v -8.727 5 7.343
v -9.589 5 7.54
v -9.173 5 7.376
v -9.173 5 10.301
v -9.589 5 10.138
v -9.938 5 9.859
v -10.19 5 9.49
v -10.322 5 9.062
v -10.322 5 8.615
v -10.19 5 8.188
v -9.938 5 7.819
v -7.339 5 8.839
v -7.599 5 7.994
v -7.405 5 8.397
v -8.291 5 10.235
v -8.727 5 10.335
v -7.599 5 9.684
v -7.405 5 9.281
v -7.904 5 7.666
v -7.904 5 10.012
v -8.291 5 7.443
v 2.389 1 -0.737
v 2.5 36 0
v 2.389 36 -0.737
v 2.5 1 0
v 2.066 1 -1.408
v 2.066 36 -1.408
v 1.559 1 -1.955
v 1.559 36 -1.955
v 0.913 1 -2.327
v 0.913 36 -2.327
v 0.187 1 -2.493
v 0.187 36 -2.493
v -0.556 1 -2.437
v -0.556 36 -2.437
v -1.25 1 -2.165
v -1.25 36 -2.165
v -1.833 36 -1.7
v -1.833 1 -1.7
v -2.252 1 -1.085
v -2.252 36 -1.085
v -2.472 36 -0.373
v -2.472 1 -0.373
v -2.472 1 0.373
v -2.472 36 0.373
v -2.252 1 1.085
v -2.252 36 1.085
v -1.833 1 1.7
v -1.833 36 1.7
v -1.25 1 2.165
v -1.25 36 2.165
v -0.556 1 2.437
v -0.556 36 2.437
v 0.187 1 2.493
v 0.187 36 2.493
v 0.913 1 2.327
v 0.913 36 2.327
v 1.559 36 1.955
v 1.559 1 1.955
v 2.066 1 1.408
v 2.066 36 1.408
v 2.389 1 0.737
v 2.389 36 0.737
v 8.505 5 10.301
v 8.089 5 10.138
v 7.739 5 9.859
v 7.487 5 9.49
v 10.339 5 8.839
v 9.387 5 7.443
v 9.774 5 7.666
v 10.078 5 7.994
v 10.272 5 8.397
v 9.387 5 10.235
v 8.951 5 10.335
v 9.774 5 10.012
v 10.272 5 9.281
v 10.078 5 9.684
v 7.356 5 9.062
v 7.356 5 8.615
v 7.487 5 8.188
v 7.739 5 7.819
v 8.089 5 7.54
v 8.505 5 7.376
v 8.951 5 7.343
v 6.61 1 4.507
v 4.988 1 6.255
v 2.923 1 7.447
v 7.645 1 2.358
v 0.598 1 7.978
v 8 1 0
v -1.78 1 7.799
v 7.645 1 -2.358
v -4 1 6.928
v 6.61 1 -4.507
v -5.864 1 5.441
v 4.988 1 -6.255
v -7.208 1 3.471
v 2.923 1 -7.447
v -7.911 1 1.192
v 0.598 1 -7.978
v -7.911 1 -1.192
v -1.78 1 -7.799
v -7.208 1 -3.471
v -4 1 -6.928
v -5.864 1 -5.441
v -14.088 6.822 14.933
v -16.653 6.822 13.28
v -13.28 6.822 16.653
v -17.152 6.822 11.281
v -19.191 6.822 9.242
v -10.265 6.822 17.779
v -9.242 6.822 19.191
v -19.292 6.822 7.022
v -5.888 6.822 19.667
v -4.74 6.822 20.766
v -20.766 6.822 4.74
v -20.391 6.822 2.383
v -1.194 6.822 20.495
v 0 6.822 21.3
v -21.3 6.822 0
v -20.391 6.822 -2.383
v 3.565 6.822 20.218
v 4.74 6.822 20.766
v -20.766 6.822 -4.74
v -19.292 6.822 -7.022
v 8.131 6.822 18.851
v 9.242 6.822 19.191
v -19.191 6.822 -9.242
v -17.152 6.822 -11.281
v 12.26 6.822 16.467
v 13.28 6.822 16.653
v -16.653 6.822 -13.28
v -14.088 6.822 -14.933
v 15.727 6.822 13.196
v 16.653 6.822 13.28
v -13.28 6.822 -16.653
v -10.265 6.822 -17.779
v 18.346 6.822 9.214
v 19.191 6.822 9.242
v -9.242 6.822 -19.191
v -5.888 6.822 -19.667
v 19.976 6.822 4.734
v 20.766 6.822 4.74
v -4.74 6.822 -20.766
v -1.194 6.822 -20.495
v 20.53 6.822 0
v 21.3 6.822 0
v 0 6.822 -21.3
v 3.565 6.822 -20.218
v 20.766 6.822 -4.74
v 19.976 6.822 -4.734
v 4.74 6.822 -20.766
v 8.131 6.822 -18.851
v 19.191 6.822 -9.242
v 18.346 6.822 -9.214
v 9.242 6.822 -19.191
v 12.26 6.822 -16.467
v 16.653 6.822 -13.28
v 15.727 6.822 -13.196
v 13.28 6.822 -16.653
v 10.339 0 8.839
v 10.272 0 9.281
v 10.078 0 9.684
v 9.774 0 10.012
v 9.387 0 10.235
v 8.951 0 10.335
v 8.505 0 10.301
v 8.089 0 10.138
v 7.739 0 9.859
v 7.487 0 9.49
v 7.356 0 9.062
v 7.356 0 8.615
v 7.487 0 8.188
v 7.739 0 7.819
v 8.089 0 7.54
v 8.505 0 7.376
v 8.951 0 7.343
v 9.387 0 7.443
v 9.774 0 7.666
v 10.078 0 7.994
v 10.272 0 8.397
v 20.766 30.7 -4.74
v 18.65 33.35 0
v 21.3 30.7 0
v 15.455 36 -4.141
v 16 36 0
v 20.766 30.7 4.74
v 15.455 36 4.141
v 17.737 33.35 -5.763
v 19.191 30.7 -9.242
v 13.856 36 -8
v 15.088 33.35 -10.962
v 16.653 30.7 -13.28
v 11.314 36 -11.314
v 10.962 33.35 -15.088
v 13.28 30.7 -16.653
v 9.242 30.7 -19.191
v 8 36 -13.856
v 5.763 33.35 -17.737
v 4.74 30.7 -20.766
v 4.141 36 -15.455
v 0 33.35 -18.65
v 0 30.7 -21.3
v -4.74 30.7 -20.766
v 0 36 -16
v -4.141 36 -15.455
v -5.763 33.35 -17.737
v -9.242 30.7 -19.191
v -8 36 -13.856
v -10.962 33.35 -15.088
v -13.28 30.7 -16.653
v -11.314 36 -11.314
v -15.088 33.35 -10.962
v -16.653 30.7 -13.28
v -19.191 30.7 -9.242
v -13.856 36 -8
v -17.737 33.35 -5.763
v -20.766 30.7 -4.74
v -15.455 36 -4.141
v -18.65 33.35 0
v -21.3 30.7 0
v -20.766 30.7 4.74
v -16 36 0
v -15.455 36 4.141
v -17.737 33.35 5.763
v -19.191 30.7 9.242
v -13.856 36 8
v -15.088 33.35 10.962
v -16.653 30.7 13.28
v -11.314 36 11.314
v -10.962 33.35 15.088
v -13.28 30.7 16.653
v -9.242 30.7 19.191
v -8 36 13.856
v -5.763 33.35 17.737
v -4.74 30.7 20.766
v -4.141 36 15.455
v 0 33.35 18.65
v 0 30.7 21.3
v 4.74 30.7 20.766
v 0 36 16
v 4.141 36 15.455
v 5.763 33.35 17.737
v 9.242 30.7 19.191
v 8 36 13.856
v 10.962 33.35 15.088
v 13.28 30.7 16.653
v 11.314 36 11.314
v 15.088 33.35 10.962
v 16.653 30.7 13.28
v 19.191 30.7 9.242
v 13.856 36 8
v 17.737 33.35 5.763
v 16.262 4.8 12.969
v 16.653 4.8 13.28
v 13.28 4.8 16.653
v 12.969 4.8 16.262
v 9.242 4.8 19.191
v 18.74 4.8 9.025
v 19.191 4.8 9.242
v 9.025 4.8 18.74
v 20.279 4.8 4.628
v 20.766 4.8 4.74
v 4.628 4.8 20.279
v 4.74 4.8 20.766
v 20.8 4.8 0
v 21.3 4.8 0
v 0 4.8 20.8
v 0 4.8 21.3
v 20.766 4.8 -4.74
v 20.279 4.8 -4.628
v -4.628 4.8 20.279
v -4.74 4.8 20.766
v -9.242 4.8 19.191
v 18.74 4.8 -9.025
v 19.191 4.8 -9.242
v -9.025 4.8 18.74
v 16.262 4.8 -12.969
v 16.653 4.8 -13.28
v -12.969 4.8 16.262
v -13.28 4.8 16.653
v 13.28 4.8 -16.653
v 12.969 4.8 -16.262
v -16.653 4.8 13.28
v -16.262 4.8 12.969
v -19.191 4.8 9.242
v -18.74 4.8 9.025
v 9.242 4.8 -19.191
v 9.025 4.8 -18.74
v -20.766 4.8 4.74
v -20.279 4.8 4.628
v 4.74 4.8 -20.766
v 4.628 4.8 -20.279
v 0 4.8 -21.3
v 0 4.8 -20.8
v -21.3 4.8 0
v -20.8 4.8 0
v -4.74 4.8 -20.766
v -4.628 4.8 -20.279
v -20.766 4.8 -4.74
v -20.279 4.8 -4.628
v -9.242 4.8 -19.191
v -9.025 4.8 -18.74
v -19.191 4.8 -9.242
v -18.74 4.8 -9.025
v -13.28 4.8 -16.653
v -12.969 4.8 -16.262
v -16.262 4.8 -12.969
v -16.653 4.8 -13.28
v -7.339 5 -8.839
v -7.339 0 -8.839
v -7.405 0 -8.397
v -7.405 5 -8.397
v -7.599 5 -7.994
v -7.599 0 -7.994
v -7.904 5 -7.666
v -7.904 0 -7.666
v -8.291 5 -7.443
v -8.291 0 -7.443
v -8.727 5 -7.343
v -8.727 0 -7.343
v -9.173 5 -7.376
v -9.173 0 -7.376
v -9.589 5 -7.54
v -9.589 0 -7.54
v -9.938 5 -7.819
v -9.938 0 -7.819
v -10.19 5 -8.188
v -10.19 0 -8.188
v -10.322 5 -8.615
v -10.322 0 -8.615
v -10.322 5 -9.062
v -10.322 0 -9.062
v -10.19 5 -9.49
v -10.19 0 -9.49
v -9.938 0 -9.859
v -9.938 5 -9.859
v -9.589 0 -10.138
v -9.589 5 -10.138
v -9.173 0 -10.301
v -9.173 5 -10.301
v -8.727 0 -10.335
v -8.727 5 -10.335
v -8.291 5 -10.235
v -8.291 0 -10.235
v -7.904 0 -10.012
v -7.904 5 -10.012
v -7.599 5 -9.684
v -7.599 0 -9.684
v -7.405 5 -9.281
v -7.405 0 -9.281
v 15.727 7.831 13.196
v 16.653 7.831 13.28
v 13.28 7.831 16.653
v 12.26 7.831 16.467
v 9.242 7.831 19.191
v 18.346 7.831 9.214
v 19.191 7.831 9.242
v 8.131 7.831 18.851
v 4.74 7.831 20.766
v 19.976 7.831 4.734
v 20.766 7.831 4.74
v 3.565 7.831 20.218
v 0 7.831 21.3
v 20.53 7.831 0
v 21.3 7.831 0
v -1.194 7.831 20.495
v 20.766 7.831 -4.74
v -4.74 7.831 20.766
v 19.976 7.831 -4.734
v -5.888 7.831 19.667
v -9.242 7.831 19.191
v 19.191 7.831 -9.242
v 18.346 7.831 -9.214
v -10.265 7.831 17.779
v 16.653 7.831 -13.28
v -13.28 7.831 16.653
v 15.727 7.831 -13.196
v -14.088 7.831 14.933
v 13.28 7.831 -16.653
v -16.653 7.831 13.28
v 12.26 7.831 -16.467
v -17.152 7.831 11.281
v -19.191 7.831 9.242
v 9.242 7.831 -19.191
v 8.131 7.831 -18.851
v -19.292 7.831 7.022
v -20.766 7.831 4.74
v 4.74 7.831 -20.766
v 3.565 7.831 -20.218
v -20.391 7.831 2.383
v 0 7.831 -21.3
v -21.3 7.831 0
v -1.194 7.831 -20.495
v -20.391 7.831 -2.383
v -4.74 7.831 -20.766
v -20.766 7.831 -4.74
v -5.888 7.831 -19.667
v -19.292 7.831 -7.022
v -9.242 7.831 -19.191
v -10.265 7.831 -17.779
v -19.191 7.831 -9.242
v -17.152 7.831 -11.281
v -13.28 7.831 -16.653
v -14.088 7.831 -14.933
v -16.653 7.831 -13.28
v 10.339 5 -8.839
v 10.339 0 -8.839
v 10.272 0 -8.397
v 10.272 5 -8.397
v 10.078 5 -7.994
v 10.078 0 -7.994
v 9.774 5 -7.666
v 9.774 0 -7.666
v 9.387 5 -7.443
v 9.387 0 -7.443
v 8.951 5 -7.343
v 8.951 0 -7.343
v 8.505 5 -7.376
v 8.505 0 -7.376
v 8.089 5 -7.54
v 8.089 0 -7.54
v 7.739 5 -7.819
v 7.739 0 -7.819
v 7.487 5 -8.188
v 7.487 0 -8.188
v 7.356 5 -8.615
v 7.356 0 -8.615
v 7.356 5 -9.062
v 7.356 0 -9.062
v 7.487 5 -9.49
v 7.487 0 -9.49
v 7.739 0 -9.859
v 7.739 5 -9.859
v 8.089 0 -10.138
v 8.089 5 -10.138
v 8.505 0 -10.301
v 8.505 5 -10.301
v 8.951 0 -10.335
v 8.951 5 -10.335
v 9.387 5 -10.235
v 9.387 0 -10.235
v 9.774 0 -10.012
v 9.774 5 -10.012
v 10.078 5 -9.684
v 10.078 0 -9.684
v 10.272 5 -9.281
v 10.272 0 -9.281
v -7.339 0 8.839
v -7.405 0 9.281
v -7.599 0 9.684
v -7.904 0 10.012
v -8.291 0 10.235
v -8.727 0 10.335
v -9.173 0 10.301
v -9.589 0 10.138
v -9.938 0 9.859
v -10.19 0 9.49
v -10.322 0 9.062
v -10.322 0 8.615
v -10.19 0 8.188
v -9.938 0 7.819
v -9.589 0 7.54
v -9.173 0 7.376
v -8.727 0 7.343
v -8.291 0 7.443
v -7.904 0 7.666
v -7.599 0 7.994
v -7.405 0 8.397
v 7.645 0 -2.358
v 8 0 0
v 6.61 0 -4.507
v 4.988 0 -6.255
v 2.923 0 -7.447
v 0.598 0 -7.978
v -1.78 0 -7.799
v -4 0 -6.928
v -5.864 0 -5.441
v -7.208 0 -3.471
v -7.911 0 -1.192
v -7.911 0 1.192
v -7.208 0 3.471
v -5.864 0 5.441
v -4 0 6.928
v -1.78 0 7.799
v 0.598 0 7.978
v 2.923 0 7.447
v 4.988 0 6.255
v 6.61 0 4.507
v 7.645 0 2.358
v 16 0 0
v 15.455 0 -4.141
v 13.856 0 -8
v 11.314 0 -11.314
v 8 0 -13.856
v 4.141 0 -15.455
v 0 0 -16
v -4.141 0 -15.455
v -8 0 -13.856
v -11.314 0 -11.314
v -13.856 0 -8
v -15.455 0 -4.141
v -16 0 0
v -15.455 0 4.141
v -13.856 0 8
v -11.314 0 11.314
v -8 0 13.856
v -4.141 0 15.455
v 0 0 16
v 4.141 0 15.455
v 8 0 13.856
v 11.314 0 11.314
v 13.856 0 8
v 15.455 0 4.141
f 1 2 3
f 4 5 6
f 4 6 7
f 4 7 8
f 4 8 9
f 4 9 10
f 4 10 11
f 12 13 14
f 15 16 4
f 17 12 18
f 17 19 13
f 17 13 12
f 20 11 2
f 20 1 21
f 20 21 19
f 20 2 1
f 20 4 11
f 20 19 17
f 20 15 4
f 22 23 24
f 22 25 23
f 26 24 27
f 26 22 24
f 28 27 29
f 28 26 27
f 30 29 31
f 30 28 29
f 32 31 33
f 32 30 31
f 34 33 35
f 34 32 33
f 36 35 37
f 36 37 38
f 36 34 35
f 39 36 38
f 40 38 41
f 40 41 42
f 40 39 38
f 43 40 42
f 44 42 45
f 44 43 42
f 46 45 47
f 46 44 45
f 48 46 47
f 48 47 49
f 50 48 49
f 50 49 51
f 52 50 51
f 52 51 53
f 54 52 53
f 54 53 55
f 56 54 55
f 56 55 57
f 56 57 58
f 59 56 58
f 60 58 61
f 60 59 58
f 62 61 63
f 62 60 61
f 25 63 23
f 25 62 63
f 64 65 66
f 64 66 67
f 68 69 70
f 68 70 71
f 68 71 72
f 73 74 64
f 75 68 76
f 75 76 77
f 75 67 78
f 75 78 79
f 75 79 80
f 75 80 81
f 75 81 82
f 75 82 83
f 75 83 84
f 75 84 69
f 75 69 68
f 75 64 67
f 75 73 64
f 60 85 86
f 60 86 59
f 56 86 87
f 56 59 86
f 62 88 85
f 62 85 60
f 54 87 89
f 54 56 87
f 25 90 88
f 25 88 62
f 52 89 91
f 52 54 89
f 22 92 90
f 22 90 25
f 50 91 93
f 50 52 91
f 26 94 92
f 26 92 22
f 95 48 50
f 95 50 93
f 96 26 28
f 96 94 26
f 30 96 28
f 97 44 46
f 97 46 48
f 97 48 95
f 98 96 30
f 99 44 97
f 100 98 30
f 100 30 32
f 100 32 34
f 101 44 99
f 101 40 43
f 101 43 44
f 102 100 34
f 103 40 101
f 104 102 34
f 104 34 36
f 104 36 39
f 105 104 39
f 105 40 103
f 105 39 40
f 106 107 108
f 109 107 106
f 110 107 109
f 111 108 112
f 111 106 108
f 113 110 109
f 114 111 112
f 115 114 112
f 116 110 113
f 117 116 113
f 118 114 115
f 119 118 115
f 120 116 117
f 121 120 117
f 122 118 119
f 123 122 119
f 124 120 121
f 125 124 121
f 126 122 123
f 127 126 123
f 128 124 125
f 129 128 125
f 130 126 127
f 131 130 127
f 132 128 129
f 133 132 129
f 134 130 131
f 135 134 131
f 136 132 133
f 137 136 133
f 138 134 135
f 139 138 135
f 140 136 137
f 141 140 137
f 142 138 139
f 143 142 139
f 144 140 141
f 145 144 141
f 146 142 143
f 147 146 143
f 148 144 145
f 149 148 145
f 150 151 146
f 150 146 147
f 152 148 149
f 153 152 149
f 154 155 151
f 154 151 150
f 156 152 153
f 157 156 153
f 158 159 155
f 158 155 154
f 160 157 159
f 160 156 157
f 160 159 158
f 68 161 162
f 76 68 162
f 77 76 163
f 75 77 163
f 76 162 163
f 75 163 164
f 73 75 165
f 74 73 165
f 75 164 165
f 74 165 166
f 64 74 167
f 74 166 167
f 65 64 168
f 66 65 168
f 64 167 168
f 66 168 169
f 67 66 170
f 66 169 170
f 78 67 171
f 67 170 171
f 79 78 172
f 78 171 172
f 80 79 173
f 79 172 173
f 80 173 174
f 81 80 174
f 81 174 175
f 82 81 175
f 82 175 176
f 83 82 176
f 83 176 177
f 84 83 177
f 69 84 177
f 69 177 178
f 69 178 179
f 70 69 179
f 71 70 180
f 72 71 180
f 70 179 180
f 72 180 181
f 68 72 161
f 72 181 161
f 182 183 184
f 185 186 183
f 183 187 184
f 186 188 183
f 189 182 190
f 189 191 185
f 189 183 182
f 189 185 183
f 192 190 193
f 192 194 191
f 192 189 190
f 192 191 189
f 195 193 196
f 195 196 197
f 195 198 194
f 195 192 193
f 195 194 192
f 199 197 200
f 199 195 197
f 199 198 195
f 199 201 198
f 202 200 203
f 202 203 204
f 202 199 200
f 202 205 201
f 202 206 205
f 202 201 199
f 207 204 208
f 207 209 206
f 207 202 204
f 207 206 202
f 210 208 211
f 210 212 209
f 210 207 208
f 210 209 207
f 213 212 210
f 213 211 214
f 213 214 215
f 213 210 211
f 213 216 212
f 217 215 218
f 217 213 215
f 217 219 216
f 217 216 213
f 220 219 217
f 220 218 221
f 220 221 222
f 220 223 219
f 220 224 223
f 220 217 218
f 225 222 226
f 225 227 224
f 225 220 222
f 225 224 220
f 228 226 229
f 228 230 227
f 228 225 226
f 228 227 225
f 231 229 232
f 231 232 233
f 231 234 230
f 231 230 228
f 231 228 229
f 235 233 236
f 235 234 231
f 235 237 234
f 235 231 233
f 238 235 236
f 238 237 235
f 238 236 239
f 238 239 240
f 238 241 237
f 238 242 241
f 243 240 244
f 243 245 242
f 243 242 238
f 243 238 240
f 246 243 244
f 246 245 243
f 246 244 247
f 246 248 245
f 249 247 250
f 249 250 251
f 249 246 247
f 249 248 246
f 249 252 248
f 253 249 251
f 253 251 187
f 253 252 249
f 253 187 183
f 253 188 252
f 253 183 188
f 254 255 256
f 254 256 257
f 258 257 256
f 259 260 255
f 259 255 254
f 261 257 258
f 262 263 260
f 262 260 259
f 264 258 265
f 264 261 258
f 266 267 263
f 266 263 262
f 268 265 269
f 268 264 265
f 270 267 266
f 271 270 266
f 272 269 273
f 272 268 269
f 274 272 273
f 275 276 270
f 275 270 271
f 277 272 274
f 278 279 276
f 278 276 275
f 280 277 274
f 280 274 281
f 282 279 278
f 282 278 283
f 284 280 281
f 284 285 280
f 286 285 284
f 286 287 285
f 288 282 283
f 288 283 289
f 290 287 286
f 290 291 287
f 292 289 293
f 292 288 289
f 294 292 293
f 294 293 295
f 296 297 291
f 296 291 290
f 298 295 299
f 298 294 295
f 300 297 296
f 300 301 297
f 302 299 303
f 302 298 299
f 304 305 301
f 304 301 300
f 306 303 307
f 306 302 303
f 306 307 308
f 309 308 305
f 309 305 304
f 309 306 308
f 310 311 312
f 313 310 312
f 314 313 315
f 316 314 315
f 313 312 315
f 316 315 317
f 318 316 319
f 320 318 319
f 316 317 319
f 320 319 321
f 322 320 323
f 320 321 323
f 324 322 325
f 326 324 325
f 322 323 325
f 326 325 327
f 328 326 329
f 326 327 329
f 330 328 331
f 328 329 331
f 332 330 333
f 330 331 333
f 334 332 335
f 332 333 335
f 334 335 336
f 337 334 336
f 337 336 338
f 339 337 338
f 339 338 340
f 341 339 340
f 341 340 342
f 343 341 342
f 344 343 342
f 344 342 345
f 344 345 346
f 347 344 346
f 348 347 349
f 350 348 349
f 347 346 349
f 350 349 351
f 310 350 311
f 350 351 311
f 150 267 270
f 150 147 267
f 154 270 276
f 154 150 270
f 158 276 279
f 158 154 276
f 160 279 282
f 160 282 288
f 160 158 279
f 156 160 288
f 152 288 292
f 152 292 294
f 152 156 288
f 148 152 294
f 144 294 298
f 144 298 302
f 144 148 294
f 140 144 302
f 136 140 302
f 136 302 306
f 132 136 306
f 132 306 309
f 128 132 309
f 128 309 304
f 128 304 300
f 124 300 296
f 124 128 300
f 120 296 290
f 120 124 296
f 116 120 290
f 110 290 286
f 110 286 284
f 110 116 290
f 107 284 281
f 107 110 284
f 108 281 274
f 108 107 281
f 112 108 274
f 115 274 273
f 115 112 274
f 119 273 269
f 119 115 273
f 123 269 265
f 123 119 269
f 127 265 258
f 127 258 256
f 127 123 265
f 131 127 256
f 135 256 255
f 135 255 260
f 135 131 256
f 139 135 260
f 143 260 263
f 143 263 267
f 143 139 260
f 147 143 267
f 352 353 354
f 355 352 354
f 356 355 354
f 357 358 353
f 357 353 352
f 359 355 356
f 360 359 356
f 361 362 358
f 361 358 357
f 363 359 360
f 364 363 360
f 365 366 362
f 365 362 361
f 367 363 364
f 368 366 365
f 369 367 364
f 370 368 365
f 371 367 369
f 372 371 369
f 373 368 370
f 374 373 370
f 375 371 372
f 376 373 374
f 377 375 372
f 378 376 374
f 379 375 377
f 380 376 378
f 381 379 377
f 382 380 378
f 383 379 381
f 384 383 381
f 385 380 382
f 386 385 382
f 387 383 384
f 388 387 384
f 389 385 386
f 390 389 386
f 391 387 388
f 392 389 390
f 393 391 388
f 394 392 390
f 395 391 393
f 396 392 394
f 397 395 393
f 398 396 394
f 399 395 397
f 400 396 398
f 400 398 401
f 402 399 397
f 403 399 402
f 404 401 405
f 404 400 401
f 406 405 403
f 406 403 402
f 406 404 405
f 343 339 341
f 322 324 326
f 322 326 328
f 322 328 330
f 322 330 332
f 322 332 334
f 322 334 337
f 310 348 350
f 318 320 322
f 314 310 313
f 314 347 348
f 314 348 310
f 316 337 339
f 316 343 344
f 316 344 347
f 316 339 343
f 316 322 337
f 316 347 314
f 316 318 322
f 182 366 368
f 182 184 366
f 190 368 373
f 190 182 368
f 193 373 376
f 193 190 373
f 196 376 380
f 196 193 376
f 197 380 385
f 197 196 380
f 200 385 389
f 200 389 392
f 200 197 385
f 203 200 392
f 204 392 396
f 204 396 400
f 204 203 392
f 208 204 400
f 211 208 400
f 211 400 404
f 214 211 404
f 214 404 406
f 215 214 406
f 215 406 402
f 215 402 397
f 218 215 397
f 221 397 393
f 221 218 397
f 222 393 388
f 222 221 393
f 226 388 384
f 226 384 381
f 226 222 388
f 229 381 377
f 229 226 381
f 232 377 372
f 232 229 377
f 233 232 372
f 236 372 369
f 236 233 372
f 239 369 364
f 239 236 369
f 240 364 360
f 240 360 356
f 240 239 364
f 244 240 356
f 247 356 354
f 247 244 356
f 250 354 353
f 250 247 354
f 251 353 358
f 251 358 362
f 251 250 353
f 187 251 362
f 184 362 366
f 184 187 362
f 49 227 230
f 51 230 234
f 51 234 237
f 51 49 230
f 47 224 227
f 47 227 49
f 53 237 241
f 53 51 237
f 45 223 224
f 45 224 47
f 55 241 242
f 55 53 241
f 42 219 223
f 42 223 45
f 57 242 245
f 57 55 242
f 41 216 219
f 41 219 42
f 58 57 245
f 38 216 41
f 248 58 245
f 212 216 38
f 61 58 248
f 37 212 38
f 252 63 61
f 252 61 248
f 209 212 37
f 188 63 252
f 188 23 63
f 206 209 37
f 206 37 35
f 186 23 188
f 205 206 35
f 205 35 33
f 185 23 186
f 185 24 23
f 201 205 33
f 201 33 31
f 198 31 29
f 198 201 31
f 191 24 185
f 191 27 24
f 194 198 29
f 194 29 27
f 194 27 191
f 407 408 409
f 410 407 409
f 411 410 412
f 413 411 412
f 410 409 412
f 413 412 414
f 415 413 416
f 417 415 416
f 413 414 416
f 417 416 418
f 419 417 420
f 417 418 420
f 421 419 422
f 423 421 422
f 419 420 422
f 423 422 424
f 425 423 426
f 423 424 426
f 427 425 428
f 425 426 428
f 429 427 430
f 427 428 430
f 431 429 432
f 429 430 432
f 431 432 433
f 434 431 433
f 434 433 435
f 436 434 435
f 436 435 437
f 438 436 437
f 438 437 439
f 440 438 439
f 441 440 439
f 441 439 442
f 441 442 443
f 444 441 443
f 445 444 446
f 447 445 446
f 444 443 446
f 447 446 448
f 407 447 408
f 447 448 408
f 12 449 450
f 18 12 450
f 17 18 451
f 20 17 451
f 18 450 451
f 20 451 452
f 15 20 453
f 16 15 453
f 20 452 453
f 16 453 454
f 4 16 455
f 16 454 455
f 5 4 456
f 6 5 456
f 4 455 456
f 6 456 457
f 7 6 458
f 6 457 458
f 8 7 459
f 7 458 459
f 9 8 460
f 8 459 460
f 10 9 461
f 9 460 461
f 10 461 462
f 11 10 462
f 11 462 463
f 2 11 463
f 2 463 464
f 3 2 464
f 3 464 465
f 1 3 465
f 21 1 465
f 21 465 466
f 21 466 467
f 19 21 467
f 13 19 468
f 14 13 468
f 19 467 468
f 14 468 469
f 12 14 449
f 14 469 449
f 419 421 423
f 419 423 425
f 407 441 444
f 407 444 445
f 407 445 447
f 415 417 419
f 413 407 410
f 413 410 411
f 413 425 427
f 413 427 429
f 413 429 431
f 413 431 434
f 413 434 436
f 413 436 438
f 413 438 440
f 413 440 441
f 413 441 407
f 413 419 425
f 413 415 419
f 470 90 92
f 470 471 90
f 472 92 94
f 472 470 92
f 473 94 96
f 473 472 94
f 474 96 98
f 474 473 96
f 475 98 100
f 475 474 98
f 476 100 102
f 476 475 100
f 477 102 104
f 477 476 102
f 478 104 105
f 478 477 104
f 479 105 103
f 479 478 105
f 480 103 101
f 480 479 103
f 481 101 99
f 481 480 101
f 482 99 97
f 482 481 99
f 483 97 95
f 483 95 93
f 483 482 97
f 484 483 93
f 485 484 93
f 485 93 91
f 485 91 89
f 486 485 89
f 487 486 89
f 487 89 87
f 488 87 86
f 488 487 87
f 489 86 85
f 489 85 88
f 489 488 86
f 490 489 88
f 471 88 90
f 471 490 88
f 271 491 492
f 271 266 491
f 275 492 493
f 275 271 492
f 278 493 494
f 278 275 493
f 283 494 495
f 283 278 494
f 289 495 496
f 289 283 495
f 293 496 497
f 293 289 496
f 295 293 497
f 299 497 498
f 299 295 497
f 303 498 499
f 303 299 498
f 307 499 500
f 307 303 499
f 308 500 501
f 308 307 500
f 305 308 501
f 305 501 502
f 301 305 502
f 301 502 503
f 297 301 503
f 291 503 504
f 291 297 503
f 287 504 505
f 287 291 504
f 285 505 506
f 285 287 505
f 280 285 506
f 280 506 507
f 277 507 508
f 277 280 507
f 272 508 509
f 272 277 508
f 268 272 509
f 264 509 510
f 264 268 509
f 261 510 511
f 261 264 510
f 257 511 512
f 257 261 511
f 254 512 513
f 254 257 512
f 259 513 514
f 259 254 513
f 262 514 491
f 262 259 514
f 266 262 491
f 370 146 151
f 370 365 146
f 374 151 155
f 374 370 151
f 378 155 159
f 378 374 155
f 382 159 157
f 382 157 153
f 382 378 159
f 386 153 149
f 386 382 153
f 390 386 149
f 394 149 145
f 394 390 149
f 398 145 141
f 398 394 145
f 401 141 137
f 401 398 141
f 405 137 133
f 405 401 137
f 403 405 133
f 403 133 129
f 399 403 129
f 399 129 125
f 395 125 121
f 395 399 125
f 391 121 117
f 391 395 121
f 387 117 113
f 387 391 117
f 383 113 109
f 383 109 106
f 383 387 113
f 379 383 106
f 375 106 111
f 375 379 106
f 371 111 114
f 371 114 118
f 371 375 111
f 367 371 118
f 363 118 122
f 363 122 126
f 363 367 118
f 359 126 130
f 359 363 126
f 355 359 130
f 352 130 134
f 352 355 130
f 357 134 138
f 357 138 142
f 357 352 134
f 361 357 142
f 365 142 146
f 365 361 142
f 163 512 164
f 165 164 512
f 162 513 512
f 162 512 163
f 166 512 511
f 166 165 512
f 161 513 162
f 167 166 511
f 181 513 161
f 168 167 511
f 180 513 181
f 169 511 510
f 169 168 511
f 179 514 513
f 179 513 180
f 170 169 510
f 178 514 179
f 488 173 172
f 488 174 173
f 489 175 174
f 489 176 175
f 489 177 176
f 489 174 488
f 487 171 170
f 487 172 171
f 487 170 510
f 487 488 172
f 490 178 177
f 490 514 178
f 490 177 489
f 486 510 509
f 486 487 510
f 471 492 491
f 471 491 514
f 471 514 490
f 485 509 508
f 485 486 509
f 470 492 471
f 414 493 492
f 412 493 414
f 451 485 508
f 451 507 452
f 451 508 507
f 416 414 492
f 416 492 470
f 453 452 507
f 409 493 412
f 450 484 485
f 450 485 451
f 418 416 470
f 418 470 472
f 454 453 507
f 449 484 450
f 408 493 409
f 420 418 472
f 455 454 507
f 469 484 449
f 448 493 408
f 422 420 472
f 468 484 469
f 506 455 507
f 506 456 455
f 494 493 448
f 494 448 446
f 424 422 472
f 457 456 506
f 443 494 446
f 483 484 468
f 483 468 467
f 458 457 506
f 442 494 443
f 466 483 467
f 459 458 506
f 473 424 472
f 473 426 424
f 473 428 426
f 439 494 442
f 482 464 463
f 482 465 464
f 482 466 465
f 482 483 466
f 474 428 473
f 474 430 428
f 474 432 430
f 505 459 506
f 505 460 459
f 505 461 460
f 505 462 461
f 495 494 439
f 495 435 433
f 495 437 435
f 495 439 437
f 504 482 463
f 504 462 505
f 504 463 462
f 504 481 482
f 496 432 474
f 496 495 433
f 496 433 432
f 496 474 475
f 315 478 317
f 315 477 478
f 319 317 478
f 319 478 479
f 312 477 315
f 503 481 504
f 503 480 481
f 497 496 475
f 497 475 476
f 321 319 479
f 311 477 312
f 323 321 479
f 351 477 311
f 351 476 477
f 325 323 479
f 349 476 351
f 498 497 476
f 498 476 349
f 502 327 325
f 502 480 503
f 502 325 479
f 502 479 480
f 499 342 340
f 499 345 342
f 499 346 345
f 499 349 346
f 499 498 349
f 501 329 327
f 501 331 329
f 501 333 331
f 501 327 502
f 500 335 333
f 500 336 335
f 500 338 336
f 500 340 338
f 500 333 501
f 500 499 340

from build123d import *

# Parameters (mm, degrees)
SKETCH2_R          = 1.5
CUT_EXTRUDE1_DEPTH = 5


with BuildPart() as part:
    # Sketch1 → Revolve1 (revolve)
    with BuildSketch(Plane.XY):
        Polygon((8, 0), (16, 0), (20.8, 4.8), (21.3, 4.8), (21.3, 6.821980551), (20.529759762, 6.821980551), (20.529759762, 7.830949193), (21.3, 7.830949193), (21.3, 30.7), (16, 36), (2.5, 36), (2.5, 1), (8, 1), align=None)
    revolve(axis=Axis((0, 0, 0), (0, 1, 0)))

    # Sketch2 → Cut-Extrude1 (cut)
    with BuildSketch(Plane.XZ):
        with Locations((-8.838834765, 8.838834765)):
            Circle(SKETCH2_R)
        with Locations((8.838834765, 8.838834765)):
            Circle(SKETCH2_R)
        with Locations((8.838834765, -8.838834765)):
            Circle(SKETCH2_R)
        with Locations((-8.838834765, -8.838834765)):
            Circle(SKETCH2_R)
    extrude(amount=-CUT_EXTRUDE1_DEPTH, mode=Mode.SUBTRACT)


solid = part.part
